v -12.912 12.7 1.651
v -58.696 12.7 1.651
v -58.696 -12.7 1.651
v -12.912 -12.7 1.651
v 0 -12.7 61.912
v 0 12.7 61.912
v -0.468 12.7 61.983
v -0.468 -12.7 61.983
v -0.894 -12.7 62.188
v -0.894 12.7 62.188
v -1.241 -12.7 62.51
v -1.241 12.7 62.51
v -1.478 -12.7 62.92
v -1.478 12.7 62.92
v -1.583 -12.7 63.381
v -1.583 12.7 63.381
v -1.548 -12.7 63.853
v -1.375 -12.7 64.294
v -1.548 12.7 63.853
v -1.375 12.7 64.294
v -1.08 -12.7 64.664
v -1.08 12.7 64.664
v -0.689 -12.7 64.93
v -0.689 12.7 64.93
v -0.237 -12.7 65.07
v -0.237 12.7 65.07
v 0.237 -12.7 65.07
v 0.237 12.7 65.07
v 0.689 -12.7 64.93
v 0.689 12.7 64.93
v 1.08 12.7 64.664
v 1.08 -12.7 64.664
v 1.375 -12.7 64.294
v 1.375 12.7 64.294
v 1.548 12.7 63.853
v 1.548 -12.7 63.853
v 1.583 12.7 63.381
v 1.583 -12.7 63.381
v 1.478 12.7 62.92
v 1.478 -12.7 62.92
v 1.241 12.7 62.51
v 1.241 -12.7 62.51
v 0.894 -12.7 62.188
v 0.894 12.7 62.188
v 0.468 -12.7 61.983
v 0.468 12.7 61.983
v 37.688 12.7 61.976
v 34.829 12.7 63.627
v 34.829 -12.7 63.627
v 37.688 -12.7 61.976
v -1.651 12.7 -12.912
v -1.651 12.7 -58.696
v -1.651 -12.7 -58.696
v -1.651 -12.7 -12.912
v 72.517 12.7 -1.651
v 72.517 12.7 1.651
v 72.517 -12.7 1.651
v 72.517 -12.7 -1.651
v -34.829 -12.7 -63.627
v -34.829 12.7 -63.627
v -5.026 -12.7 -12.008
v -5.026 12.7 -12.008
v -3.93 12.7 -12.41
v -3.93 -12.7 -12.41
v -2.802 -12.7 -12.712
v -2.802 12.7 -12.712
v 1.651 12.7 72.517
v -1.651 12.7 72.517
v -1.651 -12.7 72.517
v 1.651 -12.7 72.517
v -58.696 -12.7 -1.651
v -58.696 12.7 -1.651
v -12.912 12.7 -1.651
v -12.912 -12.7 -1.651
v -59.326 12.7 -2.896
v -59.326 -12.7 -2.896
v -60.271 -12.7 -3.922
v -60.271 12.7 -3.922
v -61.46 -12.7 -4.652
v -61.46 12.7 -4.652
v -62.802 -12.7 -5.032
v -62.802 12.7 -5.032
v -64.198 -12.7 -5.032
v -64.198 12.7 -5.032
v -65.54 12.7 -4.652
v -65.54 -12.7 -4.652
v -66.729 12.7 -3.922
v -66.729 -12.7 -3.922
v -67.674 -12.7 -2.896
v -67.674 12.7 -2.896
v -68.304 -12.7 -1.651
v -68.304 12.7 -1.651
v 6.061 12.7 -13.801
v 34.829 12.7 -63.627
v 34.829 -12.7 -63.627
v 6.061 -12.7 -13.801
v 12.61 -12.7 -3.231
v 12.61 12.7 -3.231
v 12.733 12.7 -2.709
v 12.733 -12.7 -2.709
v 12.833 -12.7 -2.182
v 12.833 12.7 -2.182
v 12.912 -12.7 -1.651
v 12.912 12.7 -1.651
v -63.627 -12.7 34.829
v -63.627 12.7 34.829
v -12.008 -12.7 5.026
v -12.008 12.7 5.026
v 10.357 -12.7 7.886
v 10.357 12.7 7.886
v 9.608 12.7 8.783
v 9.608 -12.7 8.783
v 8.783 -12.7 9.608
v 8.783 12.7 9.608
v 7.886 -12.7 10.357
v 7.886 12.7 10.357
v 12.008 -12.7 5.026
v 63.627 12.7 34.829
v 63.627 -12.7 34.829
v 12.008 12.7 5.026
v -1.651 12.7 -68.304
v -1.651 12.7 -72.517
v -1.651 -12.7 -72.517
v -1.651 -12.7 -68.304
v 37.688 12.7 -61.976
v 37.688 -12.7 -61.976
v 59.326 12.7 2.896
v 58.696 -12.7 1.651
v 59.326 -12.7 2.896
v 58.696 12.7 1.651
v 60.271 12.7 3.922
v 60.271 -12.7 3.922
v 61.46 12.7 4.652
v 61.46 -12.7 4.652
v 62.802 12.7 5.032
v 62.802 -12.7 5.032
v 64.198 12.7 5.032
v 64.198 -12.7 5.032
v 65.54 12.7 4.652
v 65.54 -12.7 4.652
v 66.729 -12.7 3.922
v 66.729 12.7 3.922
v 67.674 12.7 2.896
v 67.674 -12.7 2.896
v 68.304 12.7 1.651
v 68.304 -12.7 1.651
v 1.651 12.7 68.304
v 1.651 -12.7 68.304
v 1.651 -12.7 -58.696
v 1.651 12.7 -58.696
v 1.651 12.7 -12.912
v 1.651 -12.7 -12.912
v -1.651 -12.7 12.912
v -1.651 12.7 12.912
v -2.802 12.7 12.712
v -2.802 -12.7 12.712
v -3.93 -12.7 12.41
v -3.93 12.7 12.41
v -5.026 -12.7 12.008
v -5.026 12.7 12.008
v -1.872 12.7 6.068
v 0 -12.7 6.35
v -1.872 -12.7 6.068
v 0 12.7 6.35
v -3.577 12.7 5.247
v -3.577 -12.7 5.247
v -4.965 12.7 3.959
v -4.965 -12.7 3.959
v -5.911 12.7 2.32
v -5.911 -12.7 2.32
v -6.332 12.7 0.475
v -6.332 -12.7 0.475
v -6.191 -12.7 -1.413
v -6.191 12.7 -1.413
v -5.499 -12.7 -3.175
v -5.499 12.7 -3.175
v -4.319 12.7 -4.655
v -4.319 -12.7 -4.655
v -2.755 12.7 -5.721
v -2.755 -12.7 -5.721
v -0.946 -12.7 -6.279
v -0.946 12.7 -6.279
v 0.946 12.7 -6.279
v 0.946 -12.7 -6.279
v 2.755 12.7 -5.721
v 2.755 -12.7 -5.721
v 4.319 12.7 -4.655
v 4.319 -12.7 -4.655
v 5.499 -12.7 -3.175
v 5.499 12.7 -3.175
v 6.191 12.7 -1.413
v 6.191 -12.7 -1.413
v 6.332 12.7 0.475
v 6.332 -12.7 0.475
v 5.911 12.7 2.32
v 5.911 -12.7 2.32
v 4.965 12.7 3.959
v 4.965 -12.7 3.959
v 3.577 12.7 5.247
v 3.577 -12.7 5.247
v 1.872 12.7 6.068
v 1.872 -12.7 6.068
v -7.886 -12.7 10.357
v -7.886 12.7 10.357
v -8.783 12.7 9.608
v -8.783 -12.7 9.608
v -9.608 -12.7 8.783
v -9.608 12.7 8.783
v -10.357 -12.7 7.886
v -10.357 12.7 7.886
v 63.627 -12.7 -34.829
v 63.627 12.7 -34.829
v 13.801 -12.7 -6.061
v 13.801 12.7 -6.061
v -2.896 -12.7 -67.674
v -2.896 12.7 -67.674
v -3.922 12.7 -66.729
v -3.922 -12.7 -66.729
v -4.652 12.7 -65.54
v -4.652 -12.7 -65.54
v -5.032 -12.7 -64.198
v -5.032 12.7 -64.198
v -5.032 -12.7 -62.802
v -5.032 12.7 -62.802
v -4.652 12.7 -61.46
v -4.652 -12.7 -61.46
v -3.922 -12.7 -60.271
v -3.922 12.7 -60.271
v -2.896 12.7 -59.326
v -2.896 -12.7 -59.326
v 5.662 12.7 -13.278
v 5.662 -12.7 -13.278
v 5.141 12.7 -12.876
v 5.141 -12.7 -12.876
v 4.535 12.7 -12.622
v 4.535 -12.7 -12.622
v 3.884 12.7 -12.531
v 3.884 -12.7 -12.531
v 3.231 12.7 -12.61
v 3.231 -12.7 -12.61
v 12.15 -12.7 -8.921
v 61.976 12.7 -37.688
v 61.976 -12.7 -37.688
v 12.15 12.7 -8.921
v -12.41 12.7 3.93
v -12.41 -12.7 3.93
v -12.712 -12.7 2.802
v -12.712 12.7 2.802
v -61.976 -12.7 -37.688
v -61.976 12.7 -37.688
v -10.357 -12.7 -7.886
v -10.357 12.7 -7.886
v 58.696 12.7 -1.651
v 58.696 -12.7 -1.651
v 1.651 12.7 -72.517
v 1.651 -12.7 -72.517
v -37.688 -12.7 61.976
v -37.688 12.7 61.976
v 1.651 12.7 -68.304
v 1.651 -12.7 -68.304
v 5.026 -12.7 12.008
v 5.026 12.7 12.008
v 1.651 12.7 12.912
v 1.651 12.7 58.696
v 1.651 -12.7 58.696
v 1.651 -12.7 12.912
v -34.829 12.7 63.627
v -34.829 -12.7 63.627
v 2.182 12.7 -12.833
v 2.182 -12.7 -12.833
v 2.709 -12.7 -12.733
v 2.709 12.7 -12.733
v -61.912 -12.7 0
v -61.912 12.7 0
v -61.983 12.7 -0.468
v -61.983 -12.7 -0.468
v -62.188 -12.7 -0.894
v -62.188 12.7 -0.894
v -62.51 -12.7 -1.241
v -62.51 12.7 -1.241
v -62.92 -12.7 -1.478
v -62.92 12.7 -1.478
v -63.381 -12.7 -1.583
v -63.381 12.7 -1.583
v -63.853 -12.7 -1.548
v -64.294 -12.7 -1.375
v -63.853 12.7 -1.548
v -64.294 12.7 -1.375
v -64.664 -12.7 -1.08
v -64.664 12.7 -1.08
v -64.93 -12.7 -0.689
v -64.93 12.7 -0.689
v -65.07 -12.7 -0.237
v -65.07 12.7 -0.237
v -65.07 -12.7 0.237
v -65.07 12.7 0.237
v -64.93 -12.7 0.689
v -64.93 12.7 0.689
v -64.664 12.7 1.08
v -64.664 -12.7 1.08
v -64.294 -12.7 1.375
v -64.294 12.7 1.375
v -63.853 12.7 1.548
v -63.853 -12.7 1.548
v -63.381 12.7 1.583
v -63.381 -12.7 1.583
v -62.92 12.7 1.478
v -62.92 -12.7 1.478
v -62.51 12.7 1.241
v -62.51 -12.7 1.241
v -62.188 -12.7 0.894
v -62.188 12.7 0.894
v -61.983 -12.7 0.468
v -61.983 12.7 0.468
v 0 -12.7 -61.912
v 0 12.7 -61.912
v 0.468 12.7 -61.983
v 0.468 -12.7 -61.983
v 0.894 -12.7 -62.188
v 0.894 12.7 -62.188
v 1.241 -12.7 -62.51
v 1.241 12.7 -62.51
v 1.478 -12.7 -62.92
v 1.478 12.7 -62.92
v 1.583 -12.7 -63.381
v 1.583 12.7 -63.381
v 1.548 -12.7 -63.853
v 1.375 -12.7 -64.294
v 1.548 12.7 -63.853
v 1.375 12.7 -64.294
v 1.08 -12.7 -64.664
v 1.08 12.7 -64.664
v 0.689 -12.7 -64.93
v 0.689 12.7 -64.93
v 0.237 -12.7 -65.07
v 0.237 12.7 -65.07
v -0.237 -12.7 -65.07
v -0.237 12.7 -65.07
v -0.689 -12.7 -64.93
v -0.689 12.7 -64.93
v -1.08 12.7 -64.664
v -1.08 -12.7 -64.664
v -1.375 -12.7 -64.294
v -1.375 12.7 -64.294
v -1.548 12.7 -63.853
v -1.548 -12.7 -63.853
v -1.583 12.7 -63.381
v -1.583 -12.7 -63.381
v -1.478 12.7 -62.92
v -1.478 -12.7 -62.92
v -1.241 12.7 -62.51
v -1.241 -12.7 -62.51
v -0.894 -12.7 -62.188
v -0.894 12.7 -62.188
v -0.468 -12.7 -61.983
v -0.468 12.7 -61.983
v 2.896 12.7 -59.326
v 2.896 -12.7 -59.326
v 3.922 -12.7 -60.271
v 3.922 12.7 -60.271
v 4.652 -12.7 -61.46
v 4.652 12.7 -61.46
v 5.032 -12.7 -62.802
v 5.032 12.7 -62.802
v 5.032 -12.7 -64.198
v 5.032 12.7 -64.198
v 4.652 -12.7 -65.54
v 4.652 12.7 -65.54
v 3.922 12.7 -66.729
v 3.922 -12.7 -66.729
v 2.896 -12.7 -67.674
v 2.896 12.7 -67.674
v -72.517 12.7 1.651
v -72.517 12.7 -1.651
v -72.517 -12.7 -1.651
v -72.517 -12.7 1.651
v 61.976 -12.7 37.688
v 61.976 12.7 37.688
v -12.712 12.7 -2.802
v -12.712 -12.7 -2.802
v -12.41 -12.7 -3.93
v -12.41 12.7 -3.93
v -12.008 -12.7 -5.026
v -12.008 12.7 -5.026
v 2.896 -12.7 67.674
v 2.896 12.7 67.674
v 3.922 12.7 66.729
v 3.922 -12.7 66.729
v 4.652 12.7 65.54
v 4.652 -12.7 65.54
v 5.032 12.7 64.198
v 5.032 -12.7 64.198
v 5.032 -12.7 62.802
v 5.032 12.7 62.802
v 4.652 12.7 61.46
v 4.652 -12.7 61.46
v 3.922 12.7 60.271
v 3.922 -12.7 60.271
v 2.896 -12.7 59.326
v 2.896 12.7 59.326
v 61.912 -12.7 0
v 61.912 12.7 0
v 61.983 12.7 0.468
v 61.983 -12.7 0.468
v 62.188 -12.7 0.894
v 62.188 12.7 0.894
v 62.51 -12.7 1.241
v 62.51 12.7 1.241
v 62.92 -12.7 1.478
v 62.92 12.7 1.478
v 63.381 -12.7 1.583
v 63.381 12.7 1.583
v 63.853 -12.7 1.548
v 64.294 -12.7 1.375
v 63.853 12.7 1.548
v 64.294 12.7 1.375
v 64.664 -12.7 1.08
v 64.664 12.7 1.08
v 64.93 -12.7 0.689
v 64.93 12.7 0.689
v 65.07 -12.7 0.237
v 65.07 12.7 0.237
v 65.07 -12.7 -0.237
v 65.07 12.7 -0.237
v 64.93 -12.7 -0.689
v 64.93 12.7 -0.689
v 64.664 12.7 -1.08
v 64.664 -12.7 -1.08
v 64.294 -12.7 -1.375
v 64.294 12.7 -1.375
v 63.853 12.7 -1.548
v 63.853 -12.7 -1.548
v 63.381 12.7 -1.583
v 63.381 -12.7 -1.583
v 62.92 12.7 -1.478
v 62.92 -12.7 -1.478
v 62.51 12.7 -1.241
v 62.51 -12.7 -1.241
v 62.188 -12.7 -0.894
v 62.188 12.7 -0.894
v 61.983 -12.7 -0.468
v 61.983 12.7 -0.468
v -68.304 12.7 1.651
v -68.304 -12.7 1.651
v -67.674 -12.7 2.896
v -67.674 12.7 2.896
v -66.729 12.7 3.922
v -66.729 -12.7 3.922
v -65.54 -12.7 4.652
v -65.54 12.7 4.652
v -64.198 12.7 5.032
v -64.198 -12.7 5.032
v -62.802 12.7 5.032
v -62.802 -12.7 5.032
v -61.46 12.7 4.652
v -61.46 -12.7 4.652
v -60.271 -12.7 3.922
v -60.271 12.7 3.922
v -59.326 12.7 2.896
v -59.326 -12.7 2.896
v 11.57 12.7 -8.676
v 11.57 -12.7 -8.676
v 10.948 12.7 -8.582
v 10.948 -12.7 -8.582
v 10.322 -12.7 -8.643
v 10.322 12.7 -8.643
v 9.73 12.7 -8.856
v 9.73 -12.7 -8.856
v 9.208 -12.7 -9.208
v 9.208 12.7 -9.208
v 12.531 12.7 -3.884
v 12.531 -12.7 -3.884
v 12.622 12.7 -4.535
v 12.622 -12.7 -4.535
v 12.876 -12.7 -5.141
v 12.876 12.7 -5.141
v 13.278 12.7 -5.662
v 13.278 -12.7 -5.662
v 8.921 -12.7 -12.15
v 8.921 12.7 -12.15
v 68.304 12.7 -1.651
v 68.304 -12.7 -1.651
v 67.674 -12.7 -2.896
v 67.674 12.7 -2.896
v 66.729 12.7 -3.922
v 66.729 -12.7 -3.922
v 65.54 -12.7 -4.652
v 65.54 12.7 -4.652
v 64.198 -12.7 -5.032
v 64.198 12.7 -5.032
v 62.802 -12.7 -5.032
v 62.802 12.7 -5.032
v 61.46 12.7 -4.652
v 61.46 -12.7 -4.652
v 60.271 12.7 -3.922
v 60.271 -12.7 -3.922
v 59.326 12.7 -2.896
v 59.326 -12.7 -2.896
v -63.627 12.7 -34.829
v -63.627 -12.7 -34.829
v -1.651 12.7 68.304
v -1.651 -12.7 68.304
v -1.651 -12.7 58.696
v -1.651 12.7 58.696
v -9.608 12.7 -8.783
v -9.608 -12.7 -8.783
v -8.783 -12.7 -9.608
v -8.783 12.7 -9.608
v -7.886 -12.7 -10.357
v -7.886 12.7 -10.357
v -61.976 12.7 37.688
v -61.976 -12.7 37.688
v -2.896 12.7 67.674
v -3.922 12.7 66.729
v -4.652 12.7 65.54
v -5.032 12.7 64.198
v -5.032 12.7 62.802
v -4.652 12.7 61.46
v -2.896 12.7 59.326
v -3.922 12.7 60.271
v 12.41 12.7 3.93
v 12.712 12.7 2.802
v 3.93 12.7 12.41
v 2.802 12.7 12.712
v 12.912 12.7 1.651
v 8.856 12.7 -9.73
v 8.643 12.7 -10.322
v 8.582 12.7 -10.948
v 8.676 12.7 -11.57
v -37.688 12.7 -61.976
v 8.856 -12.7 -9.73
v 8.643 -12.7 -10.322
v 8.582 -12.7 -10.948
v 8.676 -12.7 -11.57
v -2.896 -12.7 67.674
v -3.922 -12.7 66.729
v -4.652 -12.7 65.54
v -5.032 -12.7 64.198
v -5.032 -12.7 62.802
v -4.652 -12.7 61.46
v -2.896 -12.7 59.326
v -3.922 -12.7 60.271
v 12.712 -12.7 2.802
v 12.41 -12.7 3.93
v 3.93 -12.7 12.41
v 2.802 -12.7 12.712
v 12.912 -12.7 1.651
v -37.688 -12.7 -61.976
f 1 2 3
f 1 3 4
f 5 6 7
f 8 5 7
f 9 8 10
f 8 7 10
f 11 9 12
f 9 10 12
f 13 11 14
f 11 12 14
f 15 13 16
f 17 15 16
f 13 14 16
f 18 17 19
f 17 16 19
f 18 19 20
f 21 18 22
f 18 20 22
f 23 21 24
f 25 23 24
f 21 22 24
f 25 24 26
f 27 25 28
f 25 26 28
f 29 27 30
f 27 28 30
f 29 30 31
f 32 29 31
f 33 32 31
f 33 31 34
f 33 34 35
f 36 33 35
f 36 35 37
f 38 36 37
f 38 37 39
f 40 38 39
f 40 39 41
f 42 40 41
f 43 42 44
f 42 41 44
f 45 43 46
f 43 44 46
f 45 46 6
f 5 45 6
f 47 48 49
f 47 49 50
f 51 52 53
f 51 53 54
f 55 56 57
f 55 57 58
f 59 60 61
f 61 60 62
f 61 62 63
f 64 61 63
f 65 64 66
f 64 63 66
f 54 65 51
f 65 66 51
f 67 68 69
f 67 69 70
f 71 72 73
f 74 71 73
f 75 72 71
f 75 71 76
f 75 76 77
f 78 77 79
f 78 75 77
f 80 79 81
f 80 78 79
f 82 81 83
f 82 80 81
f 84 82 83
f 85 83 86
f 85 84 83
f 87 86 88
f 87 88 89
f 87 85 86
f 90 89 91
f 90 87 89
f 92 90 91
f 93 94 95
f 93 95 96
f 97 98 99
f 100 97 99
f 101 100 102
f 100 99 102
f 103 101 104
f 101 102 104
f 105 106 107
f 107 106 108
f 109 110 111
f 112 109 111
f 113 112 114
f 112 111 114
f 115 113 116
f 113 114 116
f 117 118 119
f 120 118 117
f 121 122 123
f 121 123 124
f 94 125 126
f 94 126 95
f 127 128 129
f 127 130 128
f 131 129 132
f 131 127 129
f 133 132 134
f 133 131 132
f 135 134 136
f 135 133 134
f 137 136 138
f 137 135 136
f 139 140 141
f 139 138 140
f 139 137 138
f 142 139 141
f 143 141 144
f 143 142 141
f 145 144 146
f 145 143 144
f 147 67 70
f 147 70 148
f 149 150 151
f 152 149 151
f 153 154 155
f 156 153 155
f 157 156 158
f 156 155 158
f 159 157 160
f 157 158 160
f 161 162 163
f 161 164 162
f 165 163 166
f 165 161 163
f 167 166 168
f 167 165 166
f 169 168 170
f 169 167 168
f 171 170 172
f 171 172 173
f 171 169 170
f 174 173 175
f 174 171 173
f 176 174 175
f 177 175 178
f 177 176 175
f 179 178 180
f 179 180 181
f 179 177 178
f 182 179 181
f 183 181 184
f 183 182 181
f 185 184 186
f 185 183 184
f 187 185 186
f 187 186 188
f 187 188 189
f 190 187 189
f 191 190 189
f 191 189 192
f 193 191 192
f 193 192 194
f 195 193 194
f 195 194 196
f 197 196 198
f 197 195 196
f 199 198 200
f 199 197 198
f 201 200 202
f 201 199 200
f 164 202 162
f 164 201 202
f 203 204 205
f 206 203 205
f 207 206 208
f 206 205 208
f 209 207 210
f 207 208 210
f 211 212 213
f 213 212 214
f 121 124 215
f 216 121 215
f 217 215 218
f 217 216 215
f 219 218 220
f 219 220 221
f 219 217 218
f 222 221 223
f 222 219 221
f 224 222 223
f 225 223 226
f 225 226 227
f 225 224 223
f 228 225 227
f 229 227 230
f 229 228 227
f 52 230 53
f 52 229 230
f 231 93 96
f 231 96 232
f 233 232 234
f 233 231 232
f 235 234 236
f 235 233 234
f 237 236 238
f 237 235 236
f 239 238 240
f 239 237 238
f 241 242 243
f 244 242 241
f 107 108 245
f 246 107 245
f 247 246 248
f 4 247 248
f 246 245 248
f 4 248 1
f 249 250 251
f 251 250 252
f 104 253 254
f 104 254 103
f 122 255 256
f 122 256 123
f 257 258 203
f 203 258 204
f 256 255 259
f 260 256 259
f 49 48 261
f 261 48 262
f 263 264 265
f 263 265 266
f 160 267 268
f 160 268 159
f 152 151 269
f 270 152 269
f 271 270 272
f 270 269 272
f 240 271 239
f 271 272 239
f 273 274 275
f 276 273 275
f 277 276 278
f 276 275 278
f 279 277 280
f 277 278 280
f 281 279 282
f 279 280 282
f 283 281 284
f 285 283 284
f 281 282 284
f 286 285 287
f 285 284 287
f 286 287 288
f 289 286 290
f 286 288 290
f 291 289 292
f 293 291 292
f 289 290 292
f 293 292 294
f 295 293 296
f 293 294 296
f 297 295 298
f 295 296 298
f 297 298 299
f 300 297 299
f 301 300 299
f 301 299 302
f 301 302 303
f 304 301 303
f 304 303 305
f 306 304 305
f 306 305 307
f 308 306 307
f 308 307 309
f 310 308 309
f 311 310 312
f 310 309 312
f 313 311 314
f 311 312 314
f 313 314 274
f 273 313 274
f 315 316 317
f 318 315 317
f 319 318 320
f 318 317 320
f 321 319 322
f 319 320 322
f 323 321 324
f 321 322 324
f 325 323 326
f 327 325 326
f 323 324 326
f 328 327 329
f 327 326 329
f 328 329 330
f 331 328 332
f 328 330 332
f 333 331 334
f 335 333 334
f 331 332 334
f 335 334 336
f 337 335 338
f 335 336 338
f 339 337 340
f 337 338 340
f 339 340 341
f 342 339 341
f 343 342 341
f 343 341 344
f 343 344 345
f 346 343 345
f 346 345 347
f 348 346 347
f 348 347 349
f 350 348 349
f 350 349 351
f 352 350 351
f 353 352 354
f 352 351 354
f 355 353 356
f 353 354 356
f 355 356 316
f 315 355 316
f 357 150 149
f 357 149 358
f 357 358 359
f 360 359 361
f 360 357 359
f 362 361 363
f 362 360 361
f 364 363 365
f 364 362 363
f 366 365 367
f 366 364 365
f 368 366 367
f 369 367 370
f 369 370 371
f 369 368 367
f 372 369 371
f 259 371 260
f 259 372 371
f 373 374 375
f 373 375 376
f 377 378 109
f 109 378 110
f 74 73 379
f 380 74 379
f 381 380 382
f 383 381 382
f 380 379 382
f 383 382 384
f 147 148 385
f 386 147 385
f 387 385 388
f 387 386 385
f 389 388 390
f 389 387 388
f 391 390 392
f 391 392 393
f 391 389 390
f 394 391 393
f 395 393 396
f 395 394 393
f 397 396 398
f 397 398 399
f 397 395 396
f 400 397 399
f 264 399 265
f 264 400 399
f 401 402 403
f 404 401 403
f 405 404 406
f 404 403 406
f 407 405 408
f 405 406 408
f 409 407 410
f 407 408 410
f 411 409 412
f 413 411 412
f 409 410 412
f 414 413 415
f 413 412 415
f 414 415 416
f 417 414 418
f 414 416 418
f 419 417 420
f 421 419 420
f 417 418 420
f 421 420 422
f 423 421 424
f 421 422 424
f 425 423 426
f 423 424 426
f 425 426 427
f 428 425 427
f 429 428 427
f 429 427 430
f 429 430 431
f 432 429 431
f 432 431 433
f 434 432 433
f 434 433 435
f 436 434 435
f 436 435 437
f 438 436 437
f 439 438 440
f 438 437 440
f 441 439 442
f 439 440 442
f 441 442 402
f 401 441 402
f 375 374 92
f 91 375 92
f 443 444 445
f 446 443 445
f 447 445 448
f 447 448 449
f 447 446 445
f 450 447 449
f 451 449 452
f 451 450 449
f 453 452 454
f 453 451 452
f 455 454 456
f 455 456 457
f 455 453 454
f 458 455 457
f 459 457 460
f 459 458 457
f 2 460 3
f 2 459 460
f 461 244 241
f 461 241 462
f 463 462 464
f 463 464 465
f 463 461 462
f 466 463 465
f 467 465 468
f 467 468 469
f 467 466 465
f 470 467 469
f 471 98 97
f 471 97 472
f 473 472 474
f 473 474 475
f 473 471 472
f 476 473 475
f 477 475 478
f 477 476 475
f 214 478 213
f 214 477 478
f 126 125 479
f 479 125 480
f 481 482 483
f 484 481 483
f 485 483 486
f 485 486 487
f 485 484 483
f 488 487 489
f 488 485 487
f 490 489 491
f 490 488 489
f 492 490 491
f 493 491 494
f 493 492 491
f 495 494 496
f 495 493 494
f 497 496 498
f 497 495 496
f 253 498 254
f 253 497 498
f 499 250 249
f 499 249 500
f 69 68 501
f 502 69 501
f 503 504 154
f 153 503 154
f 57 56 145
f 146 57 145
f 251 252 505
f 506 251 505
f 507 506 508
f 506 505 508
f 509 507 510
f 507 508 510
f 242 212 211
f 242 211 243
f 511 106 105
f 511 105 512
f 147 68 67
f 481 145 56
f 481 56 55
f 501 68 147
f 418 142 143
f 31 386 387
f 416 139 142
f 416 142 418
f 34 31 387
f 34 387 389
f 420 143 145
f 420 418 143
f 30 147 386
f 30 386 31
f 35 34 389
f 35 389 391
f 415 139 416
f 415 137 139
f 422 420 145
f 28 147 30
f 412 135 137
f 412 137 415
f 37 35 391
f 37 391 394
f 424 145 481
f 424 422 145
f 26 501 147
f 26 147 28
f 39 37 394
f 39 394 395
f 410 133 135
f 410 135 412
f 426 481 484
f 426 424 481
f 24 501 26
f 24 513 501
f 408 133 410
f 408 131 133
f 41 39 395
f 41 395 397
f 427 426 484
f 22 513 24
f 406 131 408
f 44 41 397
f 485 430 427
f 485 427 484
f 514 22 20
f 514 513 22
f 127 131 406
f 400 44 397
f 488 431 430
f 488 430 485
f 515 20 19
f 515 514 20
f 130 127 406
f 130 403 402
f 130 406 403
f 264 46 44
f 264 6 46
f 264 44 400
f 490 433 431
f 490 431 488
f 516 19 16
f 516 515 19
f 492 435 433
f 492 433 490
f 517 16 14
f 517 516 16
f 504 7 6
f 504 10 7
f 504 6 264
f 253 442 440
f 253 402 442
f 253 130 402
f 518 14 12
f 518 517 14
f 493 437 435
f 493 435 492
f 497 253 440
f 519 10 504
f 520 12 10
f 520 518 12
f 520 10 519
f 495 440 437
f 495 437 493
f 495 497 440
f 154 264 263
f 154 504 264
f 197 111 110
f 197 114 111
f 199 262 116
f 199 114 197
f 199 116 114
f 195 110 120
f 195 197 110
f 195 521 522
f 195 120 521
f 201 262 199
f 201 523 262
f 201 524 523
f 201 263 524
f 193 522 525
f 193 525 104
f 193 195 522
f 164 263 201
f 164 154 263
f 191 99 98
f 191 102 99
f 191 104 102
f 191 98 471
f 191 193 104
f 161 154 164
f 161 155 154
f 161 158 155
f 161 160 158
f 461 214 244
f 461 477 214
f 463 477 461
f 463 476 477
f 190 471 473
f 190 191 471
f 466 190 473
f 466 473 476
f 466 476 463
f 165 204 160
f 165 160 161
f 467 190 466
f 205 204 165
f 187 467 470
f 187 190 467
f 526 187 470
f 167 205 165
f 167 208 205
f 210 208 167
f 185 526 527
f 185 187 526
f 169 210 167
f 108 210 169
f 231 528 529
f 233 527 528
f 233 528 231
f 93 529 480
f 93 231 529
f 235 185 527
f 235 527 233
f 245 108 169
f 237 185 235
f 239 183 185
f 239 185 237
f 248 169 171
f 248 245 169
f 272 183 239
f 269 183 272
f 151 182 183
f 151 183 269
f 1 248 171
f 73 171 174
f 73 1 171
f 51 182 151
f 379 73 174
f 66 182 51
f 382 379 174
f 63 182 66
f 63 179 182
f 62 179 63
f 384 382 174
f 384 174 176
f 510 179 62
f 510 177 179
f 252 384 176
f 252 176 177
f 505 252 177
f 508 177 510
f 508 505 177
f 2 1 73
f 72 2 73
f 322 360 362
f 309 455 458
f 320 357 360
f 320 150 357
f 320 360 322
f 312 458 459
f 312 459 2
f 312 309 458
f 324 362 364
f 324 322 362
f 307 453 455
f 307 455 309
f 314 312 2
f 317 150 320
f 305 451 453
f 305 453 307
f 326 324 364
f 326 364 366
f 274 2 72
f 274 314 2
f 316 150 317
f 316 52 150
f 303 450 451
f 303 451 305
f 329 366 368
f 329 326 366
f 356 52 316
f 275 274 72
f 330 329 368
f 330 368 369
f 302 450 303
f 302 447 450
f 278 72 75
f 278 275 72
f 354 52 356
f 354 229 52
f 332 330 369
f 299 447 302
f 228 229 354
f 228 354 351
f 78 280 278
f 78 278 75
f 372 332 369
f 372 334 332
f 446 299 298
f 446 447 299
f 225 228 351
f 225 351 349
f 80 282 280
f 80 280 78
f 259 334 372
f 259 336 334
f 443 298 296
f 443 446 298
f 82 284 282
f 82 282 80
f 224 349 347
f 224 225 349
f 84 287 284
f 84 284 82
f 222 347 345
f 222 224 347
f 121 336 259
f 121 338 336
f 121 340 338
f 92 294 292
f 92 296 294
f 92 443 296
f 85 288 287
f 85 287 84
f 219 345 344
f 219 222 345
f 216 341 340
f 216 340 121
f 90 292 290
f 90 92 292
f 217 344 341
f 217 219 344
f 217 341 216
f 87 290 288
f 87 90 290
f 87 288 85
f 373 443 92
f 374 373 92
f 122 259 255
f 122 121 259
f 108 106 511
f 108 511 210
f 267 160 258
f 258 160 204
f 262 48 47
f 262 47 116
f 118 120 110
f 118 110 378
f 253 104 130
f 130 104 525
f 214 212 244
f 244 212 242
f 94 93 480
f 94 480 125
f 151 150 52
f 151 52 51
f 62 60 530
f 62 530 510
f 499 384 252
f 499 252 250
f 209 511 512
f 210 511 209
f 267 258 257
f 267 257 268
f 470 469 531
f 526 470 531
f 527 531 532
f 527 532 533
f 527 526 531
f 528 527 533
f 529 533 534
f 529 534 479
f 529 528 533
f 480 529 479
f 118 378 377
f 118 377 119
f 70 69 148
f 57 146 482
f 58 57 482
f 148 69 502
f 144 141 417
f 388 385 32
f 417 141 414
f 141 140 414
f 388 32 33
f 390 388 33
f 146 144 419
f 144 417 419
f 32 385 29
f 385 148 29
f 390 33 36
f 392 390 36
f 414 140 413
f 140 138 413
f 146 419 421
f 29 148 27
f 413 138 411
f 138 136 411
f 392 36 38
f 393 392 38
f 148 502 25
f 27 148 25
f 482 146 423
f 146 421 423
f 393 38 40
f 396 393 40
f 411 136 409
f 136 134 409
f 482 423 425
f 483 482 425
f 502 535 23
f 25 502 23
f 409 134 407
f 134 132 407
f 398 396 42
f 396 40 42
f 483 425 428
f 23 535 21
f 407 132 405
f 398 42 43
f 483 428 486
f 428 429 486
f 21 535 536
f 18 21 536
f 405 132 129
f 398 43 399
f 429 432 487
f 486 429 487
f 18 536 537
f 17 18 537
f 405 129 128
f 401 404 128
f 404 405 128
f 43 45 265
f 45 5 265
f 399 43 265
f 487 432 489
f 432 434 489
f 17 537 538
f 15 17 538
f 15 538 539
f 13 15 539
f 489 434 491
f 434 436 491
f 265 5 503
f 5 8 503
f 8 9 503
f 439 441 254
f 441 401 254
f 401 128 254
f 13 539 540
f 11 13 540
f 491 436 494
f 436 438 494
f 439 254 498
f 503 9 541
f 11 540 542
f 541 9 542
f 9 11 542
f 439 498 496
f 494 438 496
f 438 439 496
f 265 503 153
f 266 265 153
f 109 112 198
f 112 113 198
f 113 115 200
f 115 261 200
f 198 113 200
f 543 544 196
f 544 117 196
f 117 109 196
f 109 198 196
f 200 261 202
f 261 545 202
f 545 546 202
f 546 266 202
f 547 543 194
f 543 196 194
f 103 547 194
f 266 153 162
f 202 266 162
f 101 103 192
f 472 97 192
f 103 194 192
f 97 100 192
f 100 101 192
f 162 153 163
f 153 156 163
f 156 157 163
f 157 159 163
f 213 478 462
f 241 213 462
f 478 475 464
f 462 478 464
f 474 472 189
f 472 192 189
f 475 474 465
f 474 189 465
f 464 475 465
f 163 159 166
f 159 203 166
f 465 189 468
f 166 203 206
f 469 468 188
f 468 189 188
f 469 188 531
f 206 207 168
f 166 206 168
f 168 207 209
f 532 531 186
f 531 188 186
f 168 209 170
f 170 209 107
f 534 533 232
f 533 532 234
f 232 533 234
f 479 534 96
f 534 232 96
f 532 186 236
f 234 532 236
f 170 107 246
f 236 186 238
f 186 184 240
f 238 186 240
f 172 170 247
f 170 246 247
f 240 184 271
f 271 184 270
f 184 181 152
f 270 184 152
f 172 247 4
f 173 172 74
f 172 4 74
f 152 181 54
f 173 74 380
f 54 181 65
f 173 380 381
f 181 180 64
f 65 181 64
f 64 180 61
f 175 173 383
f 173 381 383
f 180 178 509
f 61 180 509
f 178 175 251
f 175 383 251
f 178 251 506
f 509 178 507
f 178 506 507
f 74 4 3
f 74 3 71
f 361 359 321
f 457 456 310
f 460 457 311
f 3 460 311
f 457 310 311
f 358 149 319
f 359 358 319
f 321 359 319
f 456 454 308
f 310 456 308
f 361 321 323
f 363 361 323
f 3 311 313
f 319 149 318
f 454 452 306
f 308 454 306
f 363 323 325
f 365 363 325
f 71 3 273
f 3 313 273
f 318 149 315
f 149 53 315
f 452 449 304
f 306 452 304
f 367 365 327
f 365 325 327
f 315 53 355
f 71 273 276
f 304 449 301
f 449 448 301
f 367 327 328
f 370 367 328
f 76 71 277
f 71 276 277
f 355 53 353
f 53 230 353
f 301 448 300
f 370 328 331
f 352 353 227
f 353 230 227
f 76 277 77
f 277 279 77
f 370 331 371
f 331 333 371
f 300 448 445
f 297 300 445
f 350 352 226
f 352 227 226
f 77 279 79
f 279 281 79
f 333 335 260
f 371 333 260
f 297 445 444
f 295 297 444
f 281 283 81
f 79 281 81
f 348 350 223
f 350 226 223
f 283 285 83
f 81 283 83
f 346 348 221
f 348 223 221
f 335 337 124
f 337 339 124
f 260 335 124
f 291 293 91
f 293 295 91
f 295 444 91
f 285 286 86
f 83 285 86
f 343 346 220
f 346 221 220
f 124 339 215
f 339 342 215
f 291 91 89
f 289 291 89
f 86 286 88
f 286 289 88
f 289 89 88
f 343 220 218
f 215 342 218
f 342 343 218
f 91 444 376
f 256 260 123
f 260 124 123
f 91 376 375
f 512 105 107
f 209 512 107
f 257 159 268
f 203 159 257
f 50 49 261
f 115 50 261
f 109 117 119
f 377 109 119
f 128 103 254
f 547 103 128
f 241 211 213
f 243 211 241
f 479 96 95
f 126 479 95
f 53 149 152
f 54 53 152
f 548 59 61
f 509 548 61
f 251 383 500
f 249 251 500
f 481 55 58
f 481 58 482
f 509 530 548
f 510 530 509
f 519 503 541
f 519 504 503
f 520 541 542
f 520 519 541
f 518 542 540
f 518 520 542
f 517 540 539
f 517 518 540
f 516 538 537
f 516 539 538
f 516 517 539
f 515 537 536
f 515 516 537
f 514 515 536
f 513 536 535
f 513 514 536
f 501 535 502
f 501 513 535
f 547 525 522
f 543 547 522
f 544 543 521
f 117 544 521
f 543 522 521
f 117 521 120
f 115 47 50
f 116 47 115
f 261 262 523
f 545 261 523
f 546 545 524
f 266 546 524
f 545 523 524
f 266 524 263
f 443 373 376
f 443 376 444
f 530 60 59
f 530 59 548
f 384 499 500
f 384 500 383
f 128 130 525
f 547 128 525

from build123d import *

# Parameters (mm, degrees)
SKETCH1_W           = 6.6675
SKETCH1_H           = 25.4
SKETCH2_W           = 3.302
SKETCH2_H           = 62.357
BOSS_EXTRUDE1_DEPTH = 25.4
CIRPATTERN1_COUNT   = 12
FILLET1_R           = 2.54
SKETCH4_R           = 5.08
SKETCH4_R_2         = 1.5875
BOSS_EXTRUDE2_DEPTH = 25.4
SKETCH5_R           = 1.5875
CUT_EXTRUDE2_DEPTH  = 25.4
CIRPATTERN2_COUNT   = 4


with BuildPart() as part:
    # Sketch1 → Revolve1 (revolve)
    with BuildSketch(Plane.XY, mode=Mode.PRIVATE) as revolve1_sk:
        with Locations((9.68375, 0)):
            Rectangle(SKETCH1_W, SKETCH1_H)
    revolve(revolve1_sk.sketch.rotate(Axis((0, 37.278132, 0), (0, -1, 0)), 90), axis=Axis((0, 37.278132, 0), (0, -1, 0)))

    # Sketch2 → Boss-Extrude1 (add)
    with BuildSketch(Plane(origin=(0, 12.7, 0), x_dir=(1, 0, 0), z_dir=(0, 1, 0))):
        with Locations((0, -41.3385)):
            Rectangle(SKETCH2_W, SKETCH2_H)
    boss_extrude1 = extrude(amount=-BOSS_EXTRUDE1_DEPTH)

    # CirPattern1: Boss-Extrude1 ×12 about axis
    cirpattern1_axis = Axis((0, 0, 0), (0, 1, 0))
    for i in range(1, CIRPATTERN1_COUNT):
        add(boss_extrude1.rotate(cirpattern1_axis, i * 360 / CIRPATTERN1_COUNT))

    # Fillet1
    # the kernel refuses this fillet: 2.54 mm, written as the material it adds along each edge
    with BuildSketch(Plane(origin=(12.007947359, 12.7, -5.026381051), x_dir=(0.8660254037844386, 0, -0.5000000000000003), z_dir=(0, -1, 0)), Plane(origin=(7.885996935, 12.7, -10.356947359), x_dir=(0.5000000000000001, 0, -0.8660254037844385), z_dir=(0, -1, 0))) as fillet1_piece_1:
        with BuildLine():
            CenterArc((2.069989159, 2.54), FILLET1_R, 195.62783797, 74.37216203)
            ThreePointArc((-0.3761116, 1.855755102), (-0.154269512, 0.934725122), (0, 0))
            Line((0, 0), (2.069989159, 0))
        make_face()
    extrude(amount=25.4)
    with BuildSketch(Plane(origin=(10.356947359, 12.7, -7.885996935), x_dir=(-0.6620593723913752, 0, -0.7494513909712479), z_dir=(0, -1, 0)), Plane(origin=(5.026381051, 12.7, -12.007947359), x_dir=(-0.9480859307901371, 0, -0.31801425728699545), z_dir=(0, -1, 0))) as fillet1_piece_2:
        with BuildLine():
            CenterArc((2.078215675, 2.533273519), FILLET1_R, 191.457121991, 74.37216203)
            Line((-0.411171344, 2.028741788), (0, 0))
            ThreePointArc((0, 0), (0.946742697, 0.034473214), (1.893485393, 0))
        make_face()
    extrude(amount=25.4)

    # Sketch4 → Boss-Extrude2 (add)
    with BuildSketch(Plane(origin=(0, 12.7, 0), x_dir=(1, 0, 0), z_dir=(0, 1, 0))):
        with Locations((0, 63.5)):
            Circle(SKETCH4_R)
        with Locations((0, 63.5)):
            Circle(SKETCH4_R_2, mode=Mode.SUBTRACT)
    boss_extrude2 = extrude(amount=-BOSS_EXTRUDE2_DEPTH)

    # Sketch5 → Cut-Extrude2 (cut)
    with BuildSketch(Plane(origin=(0, 12.7, 0), x_dir=(1, 0, 0), z_dir=(0, 1, 0))):
        with Locations(Location((0, 63.5, 0), (0, 0, 270))):
            Circle(SKETCH5_R)
    cut_extrude2 = extrude(amount=-CUT_EXTRUDE2_DEPTH, mode=Mode.SUBTRACT)

    # CirPattern2: Boss-Extrude2, Cut-Extrude2 ×4 about axis
    cirpattern2_axis = Axis((0, 0, 0), (0, 1, 0))
    add([boss_extrude2.rotate(cirpattern2_axis, i * 360 / CIRPATTERN2_COUNT) for i in range(1, CIRPATTERN2_COUNT)])
    add([cut_extrude2.rotate(cirpattern2_axis, i * 360 / CIRPATTERN2_COUNT) for i in range(1, CIRPATTERN2_COUNT)], mode=Mode.SUBTRACT)


solid = part.part
